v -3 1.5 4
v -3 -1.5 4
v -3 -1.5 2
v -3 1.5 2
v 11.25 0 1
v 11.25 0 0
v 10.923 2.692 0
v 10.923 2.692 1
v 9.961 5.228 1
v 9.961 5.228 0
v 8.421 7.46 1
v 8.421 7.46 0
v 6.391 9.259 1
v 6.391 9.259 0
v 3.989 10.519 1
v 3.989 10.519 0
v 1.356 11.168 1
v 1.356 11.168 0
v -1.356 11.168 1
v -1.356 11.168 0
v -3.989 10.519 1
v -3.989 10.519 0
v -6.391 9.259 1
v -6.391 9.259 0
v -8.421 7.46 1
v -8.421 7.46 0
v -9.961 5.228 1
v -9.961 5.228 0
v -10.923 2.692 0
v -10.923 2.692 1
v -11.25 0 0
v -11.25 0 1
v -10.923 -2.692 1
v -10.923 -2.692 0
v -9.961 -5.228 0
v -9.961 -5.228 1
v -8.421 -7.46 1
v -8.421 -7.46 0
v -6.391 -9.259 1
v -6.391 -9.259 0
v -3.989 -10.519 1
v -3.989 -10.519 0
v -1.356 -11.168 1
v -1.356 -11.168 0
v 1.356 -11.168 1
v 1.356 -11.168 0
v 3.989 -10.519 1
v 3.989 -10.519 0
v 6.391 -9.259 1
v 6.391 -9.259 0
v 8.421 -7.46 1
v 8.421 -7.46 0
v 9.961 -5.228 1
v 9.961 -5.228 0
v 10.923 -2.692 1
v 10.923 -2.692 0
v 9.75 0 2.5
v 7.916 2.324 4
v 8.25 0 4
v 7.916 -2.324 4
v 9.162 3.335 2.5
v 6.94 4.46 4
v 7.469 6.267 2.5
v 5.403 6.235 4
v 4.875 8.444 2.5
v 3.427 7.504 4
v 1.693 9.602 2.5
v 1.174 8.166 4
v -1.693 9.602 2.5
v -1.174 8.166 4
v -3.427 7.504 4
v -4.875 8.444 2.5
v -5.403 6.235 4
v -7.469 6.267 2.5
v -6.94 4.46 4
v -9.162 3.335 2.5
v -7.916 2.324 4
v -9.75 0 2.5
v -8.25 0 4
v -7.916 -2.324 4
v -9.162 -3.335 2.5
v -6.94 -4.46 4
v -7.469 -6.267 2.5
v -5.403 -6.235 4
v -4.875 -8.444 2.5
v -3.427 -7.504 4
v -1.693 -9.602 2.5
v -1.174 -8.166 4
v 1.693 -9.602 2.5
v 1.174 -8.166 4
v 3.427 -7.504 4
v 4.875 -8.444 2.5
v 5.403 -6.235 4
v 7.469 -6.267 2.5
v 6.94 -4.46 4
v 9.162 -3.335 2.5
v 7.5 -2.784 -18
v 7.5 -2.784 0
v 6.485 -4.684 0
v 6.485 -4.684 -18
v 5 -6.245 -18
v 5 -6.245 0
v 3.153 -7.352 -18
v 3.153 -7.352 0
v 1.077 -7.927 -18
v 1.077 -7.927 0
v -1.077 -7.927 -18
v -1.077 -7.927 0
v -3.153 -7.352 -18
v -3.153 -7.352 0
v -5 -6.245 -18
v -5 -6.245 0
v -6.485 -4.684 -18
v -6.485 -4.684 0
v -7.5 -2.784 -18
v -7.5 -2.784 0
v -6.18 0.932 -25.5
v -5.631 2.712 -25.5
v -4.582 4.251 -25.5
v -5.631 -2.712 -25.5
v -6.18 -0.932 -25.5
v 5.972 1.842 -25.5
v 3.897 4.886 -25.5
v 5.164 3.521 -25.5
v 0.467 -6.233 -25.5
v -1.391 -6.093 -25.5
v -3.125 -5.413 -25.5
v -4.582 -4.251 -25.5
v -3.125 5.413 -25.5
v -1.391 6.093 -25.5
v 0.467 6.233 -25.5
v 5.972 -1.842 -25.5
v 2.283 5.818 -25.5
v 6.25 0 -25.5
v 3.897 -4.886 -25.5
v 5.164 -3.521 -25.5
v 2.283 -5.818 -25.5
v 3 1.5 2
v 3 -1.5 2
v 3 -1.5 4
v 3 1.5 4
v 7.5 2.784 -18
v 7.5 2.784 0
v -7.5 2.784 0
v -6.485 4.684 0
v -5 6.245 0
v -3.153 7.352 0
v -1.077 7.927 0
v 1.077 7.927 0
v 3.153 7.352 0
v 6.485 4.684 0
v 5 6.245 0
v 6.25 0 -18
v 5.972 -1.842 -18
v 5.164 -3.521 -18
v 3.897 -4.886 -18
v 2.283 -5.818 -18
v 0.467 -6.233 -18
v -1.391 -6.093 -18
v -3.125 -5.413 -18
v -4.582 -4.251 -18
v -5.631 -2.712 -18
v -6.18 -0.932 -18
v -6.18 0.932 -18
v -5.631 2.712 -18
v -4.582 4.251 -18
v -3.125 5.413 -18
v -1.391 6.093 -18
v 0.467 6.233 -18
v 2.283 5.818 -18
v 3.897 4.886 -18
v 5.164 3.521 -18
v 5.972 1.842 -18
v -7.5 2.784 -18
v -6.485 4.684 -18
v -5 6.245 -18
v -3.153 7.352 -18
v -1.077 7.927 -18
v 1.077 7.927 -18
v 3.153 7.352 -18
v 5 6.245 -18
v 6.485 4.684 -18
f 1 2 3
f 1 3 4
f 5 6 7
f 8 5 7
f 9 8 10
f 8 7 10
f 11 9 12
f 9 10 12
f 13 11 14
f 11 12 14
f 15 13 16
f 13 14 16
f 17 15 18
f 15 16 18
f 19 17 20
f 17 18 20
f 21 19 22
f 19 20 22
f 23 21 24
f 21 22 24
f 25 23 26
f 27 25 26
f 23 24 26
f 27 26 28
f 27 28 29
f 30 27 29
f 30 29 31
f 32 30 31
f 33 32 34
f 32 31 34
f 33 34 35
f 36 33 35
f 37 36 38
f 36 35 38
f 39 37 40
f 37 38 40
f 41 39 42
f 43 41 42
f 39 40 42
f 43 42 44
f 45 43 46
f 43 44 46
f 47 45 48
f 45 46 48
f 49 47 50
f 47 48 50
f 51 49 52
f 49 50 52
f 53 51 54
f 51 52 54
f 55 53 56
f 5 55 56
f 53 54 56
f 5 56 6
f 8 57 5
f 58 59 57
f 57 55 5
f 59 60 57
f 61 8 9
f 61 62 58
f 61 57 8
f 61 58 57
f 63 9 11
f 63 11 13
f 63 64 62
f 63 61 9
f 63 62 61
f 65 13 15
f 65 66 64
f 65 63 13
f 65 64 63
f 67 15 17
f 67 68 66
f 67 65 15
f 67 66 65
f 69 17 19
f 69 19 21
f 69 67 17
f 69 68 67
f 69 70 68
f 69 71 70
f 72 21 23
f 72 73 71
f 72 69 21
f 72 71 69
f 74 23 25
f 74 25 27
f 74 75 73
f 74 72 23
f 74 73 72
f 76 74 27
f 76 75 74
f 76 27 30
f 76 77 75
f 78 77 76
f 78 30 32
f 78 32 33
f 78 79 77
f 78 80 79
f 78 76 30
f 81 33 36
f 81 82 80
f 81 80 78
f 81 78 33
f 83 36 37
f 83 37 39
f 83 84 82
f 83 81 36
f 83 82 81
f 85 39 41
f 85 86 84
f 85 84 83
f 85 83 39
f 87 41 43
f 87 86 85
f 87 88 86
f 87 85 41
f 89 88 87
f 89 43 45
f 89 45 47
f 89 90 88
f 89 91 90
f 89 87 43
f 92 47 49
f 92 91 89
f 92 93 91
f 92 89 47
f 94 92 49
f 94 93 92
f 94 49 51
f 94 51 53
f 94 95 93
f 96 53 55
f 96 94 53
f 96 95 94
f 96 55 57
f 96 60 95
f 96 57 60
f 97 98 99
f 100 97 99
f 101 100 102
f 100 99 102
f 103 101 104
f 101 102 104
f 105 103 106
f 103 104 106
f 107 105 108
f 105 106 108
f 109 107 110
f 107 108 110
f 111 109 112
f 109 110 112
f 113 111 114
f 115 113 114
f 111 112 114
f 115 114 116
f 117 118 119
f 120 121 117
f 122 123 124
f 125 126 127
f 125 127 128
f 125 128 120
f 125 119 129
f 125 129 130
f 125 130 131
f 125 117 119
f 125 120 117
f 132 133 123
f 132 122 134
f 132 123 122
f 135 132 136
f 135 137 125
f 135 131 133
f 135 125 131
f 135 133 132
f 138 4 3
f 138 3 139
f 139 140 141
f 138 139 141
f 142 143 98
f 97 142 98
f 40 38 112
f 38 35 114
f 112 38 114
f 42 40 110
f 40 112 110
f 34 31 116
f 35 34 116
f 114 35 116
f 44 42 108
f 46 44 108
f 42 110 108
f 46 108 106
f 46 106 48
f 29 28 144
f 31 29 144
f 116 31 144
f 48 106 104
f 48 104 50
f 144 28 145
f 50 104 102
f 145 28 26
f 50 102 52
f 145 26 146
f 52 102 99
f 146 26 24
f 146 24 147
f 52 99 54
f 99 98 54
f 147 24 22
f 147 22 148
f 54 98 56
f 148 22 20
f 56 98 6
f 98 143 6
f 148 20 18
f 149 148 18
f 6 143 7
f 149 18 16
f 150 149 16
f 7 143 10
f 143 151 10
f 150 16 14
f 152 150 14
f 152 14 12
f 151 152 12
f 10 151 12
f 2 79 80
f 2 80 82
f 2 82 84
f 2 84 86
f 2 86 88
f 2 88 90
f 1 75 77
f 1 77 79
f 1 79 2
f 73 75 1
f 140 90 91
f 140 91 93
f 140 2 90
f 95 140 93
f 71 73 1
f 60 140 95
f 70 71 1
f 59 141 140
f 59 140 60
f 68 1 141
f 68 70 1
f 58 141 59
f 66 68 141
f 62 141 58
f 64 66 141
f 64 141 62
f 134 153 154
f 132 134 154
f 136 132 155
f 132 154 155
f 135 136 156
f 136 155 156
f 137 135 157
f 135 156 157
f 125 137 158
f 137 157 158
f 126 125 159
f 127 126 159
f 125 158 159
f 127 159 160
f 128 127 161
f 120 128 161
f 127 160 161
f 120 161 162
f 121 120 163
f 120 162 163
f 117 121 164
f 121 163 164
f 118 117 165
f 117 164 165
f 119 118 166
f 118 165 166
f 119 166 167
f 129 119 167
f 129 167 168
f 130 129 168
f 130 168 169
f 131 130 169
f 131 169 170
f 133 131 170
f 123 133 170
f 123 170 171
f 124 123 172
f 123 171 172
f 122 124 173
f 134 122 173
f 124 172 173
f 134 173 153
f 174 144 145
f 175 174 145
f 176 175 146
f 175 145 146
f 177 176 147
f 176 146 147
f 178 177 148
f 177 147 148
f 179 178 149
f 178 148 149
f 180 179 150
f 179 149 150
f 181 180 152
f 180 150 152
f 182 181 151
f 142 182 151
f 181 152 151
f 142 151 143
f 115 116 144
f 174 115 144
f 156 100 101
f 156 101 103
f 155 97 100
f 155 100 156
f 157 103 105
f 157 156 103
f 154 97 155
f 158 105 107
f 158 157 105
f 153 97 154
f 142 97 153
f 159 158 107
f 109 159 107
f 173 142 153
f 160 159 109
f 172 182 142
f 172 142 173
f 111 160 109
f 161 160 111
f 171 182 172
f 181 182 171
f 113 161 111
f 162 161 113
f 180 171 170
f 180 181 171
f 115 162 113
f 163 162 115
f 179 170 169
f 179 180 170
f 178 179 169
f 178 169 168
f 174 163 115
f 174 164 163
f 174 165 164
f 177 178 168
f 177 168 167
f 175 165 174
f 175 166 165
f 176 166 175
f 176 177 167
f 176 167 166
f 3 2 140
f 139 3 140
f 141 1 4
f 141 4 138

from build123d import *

# Parameters (mm, degrees)
SKETCH_1_R          = 11.25
EXTRUDE_1_DEPTH     = 4
CHAMFER_1_SIZE      = 3
SKETCH_2_W          = 6
SKETCH_2_H          = 3
CUT_EXTRUDE_1_DEPTH = 2
EXTRUDE_2_DEPTH     = 18
SKETCH_4_R          = 6.25
EXTRUDE_3_DEPTH     = 7.5


with BuildPart() as part:
    # 草图1 → 拉伸1 (new body)
    with BuildSketch(Plane.XY):
        Circle(SKETCH_1_R)
    extrude(amount=EXTRUDE_1_DEPTH)

    # 倒角1
    chamfer_1_edges = [part.edges().sort_by_distance(p)[0] for p in [
        (-11.25, 0, 4),
    ]]
    chamfer(chamfer_1_edges, length=CHAMFER_1_SIZE)

    # 草图2 → 切除-拉伸1 (cut)
    with BuildSketch(Plane.XY.offset(4)):
        Rectangle(SKETCH_2_W, SKETCH_2_H)
    extrude(amount=-CUT_EXTRUDE_1_DEPTH, mode=Mode.SUBTRACT)

    # 草图3 → 拉伸2 (add)
    with BuildSketch(Plane(origin=(0, 0, 0), x_dir=(-1, 0, 0), z_dir=(0, 0, -1))):
        with BuildLine():
            Line((-7.5, 2.783882181), (-7.5, -2.783882181))
            ThreePointArc((-7.5, -2.783882181), (0, -8), (7.5, -2.783882181))
            Line((7.5, -2.783882181), (7.5, 2.783882181))
            ThreePointArc((7.5, 2.783882181), (0, 8), (-7.5, 2.783882181))
        make_face()
    extrude(amount=EXTRUDE_2_DEPTH)

    # 草图4 → 拉伸3 (add)
    with BuildSketch(Plane(origin=(0, 0, -18), x_dir=(-1, 0, 0), z_dir=(0, 0, -1))):
        with Locations(Location((0, 0, 0), (0, 0, 180))):
            Circle(SKETCH_4_R)
    extrude(amount=EXTRUDE_3_DEPTH)


solid = part.part
